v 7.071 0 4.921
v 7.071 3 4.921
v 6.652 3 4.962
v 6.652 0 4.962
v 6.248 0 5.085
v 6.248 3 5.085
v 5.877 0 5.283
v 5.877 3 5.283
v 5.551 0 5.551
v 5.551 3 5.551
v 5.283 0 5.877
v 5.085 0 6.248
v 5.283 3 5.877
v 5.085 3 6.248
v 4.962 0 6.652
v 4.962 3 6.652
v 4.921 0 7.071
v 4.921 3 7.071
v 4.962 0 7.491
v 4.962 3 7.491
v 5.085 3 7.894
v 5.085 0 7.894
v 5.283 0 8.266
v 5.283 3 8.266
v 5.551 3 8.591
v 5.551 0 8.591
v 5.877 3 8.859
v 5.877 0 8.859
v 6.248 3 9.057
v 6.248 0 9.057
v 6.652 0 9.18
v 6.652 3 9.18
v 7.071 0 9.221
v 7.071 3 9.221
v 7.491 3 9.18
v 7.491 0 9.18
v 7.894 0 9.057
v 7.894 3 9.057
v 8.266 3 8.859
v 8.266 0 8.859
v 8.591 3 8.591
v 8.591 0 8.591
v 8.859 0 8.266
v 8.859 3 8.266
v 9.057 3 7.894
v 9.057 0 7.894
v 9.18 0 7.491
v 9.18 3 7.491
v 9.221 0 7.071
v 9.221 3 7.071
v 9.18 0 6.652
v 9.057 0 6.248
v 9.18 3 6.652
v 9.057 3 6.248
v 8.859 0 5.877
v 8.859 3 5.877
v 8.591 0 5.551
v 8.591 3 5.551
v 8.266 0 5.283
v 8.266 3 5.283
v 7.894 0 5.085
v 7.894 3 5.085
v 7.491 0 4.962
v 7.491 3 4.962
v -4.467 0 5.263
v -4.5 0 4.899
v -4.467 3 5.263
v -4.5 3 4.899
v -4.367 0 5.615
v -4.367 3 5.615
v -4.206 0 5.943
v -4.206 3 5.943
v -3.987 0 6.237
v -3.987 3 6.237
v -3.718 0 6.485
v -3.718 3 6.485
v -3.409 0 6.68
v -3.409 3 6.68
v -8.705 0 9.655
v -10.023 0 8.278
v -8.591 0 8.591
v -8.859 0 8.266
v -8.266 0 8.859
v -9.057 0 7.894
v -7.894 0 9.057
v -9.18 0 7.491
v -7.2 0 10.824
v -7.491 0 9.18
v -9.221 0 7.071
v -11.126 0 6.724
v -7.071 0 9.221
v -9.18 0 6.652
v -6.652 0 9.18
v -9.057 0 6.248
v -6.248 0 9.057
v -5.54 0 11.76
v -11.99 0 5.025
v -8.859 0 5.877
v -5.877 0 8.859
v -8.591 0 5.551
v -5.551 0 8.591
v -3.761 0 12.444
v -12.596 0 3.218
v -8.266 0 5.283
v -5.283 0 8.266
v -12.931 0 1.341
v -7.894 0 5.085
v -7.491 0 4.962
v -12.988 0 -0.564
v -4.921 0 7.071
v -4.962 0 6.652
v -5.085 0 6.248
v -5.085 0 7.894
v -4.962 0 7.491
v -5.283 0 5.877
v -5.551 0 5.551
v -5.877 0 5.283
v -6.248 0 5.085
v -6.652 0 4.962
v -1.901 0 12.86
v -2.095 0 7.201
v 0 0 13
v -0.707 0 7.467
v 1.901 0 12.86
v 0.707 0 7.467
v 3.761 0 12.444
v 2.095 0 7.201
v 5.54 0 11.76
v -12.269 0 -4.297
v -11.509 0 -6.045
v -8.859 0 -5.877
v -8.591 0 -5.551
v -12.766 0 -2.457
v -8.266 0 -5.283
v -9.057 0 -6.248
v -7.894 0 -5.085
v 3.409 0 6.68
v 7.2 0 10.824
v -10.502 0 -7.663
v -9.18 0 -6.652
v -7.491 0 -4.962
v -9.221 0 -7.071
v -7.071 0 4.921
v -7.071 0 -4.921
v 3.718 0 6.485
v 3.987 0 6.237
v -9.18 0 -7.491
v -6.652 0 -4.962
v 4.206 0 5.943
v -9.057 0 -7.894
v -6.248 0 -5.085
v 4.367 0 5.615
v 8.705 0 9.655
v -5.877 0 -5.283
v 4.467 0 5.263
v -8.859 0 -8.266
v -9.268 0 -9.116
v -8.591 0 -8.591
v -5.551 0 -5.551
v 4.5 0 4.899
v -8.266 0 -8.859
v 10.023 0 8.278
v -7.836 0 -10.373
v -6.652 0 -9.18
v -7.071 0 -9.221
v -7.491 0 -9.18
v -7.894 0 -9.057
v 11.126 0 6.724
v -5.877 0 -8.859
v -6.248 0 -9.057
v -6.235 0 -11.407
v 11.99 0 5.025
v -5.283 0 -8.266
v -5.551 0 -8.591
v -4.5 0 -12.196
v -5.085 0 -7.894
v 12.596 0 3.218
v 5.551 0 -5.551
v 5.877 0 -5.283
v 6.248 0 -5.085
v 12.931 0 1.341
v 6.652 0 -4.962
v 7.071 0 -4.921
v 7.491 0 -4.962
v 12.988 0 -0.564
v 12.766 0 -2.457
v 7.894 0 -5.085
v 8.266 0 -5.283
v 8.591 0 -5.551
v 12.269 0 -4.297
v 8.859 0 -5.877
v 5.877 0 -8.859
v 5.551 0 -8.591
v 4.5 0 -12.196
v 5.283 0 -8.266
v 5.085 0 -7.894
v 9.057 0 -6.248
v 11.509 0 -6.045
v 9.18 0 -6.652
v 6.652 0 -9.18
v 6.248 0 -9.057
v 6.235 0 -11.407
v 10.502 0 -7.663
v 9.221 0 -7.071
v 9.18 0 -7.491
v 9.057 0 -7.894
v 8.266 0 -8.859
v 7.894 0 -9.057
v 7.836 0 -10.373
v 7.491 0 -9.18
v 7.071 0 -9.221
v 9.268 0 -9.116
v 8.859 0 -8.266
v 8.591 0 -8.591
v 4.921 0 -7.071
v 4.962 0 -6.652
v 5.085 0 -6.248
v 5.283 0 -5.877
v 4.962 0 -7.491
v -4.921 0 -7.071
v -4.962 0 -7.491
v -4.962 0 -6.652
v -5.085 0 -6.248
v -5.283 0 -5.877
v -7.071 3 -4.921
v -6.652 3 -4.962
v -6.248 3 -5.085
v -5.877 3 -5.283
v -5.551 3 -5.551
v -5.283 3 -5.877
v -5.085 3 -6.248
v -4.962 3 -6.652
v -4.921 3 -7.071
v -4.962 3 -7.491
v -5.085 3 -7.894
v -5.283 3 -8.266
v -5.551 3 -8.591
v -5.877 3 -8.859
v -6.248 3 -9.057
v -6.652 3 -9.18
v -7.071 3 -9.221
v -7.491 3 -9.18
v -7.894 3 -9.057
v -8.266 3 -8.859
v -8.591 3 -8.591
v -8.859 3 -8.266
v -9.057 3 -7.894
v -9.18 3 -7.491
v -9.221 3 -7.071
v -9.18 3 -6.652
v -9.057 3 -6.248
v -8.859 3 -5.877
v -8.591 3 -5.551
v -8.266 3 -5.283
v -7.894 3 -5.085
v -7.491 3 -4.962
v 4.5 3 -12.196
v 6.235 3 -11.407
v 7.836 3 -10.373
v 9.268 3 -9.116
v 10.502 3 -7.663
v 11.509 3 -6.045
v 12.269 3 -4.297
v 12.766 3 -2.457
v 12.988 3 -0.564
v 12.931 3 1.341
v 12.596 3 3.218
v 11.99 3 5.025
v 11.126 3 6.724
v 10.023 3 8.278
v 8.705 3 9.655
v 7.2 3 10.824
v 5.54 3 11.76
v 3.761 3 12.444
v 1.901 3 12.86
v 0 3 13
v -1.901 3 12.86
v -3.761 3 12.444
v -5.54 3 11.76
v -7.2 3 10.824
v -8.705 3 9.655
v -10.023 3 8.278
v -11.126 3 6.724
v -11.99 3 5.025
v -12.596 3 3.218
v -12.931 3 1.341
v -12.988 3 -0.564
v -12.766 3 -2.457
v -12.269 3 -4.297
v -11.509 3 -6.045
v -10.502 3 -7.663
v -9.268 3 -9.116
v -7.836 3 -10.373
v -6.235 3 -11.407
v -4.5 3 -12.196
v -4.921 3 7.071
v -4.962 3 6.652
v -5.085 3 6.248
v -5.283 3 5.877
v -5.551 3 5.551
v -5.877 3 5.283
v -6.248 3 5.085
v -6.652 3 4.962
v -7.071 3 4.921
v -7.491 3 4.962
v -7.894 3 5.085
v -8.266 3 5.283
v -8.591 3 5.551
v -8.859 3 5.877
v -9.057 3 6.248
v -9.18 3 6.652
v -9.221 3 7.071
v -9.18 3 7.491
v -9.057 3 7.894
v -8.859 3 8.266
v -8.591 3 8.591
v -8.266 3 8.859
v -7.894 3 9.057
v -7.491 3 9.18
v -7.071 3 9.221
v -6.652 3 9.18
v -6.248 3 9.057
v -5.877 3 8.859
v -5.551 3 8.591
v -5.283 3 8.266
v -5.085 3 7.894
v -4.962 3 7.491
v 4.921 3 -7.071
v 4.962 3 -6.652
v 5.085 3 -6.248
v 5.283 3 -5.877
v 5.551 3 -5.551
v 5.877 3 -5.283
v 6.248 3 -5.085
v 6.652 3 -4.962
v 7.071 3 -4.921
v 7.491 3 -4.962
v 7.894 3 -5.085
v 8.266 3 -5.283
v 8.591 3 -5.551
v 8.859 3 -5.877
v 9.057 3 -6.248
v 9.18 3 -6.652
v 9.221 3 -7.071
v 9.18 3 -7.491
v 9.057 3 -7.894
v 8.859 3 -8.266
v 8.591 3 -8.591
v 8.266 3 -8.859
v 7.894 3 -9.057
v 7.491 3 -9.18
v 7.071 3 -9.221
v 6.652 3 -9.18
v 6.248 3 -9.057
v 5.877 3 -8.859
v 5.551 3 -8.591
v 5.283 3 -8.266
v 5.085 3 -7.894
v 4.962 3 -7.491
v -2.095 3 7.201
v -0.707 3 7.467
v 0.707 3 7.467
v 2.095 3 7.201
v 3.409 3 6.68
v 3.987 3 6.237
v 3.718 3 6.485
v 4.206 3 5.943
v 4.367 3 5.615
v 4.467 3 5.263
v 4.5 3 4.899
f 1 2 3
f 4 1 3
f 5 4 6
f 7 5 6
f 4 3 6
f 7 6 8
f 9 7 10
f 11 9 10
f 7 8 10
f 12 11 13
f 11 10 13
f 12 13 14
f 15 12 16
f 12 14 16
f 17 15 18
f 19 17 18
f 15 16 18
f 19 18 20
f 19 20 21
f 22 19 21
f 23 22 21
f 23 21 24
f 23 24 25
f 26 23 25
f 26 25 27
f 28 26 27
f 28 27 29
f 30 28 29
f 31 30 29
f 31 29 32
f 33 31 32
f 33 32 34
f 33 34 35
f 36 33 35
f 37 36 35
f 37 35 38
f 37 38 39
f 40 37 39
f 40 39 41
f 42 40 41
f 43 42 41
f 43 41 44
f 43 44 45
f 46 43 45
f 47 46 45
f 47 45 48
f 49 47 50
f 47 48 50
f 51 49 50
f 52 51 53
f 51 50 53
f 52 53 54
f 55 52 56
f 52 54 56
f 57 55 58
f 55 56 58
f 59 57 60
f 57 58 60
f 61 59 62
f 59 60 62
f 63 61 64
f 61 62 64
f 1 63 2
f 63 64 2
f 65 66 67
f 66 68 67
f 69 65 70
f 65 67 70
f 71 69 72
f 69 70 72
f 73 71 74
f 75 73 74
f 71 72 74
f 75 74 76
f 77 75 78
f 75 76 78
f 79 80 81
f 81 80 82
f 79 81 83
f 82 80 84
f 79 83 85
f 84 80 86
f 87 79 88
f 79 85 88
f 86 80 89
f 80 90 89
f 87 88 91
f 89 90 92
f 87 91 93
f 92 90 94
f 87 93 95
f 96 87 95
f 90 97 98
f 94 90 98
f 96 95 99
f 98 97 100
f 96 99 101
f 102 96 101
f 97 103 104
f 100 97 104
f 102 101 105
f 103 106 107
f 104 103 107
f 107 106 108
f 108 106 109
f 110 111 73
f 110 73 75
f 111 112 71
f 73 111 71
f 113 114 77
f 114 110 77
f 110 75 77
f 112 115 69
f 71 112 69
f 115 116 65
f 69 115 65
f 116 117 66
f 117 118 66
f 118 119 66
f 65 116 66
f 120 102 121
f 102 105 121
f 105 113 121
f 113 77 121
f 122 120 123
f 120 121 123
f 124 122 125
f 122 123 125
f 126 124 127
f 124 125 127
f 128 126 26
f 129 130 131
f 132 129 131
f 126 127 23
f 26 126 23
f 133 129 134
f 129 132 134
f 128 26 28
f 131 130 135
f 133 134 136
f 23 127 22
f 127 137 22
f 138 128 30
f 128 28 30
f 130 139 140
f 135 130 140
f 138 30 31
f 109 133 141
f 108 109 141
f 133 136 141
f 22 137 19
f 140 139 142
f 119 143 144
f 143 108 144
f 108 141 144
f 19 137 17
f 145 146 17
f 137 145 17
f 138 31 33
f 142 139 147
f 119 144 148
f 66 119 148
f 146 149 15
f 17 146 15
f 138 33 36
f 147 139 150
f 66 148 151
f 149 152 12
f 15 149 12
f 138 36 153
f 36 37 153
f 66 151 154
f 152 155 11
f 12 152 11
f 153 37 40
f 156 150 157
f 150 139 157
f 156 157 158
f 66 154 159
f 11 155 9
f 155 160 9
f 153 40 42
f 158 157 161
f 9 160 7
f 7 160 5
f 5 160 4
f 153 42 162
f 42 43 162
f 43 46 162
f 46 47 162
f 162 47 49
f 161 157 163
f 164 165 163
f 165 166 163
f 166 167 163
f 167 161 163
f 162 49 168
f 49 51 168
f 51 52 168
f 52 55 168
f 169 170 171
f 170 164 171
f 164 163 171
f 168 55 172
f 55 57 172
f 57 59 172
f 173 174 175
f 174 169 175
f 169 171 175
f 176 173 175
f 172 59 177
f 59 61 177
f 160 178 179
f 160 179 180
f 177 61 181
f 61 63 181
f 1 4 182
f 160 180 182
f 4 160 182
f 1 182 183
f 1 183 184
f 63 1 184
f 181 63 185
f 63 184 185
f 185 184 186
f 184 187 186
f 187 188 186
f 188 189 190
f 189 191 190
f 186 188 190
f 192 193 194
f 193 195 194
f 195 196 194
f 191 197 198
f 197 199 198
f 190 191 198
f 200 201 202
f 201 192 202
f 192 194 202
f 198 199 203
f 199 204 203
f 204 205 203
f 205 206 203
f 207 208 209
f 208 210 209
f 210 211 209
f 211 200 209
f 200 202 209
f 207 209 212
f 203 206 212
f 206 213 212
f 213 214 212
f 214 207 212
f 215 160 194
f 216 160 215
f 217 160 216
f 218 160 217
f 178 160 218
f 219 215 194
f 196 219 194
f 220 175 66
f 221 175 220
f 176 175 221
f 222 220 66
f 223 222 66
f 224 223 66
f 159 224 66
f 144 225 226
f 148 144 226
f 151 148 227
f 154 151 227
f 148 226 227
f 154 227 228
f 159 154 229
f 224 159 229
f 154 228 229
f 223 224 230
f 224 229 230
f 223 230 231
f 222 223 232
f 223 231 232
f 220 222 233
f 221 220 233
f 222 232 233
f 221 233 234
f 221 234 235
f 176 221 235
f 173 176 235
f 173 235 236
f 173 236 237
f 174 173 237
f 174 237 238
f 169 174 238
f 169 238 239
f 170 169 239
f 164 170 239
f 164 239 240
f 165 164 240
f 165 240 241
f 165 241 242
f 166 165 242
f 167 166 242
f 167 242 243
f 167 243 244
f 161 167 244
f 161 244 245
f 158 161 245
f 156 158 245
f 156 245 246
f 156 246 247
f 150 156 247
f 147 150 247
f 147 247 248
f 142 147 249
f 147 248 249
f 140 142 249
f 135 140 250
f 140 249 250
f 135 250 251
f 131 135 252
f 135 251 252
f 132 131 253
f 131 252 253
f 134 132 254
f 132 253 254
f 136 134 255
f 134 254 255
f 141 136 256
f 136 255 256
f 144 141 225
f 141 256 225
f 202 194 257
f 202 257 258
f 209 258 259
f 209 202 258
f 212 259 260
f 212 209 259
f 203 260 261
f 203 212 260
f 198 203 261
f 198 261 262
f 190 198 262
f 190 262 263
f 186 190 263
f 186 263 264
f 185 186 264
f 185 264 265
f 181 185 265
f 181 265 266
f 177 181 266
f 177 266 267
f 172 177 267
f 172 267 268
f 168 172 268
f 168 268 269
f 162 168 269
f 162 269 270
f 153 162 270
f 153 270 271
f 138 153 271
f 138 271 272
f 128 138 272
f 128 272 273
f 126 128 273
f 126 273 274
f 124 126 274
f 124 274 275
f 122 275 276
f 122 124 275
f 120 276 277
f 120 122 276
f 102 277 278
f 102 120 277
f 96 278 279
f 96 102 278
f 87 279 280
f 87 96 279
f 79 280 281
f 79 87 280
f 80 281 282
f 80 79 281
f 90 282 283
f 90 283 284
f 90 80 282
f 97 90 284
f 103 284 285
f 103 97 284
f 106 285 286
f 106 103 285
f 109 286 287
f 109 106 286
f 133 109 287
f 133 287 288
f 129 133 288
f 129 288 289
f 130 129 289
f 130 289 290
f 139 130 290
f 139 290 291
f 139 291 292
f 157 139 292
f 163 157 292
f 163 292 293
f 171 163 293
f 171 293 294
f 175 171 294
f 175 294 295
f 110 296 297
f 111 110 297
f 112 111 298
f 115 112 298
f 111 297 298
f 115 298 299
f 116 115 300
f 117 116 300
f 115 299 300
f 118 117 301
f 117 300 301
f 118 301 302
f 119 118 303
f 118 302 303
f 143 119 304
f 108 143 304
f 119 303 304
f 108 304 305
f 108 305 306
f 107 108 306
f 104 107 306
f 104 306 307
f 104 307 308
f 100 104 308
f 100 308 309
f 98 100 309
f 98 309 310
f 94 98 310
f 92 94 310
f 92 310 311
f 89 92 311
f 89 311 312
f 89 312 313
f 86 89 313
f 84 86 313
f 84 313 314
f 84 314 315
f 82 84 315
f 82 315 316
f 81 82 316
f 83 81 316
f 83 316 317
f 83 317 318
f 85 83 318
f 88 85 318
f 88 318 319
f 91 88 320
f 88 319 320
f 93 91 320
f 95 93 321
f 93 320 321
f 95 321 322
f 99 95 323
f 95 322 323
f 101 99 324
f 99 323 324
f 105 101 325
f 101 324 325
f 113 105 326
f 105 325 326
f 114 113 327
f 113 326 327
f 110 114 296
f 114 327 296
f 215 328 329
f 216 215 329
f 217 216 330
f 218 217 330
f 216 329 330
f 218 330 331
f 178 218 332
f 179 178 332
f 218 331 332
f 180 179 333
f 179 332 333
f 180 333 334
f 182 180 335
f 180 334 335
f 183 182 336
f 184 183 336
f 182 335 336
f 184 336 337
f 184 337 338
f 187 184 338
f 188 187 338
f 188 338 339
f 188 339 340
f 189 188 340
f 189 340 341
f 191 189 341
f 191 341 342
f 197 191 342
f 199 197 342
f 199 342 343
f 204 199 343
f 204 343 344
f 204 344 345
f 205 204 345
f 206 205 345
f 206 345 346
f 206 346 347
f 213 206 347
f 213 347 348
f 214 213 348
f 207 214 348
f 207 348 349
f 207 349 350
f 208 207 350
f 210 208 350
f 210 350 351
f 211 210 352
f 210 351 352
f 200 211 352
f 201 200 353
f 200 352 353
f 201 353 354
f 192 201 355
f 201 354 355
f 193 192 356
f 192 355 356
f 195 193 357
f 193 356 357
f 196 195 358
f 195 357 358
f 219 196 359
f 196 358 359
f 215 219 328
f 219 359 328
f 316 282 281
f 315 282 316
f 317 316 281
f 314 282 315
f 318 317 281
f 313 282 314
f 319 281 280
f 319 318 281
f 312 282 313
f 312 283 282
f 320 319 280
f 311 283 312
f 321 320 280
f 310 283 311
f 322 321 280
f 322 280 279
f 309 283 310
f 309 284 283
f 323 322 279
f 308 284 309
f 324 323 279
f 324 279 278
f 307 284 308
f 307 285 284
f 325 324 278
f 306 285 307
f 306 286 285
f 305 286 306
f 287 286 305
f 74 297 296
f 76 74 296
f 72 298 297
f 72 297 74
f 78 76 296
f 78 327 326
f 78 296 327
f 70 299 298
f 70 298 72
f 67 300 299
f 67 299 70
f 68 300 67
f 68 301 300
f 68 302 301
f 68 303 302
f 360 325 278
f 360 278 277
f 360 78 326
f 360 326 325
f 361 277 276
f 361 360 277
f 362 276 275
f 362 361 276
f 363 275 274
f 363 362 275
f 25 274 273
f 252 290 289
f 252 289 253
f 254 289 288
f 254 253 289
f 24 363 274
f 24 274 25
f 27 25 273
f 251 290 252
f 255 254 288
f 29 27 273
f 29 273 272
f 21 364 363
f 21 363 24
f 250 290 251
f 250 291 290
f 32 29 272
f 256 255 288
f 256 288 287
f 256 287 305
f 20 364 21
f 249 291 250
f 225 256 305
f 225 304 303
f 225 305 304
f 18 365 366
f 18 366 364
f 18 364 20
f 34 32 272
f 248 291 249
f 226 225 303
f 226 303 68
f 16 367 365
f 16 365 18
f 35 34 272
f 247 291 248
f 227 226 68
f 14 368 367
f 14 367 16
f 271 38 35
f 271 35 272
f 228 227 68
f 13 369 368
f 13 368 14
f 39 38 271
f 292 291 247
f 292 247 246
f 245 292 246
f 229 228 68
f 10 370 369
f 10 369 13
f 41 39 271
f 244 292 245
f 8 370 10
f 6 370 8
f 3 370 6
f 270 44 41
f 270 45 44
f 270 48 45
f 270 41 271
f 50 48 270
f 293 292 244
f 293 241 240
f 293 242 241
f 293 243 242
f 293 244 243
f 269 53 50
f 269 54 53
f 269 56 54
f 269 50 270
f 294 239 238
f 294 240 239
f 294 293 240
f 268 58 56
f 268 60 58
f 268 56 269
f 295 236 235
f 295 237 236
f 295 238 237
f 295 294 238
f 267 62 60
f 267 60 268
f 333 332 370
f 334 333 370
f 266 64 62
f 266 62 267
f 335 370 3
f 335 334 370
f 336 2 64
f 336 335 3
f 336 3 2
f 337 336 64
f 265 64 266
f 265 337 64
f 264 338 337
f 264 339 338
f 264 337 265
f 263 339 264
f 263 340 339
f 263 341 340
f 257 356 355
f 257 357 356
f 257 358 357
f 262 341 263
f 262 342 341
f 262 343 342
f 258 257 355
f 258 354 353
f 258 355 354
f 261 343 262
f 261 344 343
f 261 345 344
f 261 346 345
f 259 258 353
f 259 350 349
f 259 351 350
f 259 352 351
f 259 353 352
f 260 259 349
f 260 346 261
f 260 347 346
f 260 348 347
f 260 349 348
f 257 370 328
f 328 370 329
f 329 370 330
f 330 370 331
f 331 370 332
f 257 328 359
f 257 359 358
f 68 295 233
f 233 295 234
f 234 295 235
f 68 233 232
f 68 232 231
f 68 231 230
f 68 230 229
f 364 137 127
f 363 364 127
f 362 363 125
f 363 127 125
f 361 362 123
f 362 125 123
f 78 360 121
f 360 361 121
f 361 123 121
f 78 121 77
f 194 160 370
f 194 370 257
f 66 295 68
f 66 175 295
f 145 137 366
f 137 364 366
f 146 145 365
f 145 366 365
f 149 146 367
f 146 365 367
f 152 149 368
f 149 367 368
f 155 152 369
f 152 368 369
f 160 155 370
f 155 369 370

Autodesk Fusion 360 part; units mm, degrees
sketch "Sketch1" plane through (0, 0, 0) normal (0, 1, 0) x (1, 0, 0)
  circle A0 centre (0, 0) radius 13
  circle A1 centre (0, 0) radius 7.5
  line L0 (-4.5, 12.1963) -> (-4.5, -6)
  line L1 (4.5, -6) -> (4.5, 12.1963)
  circle A2 centre (0, 0) radius 10 construction
  line L2 (0, 0) -> (7.0711, -7.0711)
  line L3 (0, 0) -> (13, 0) construction
  point P0 (7.0711, -7.0711)
  dimension "d1" = 26
  dimension "d2" = 15
  dimension "d3" = 9
  dimension "d4" = 20
  dimension "d12" = 45
extrude "Extrude1" add sketch "Sketch1" along normal blind 3 contours A0 A1 L0 L1 | A1 L1 L2 | A1 L0 | A1 L1 L2 picked at (8.8444, -6.7794)
hole "Hole1" at (7.0711, 0, 7.0711) direction (0, 1, 0) diameter 4.3 end through all
pattern_circular "C-Pattern1" count 4 over 360 about axis through (0, 1.75, 0) along (0, 1, 0) of "Hole1"
fillet "Fillet1" radius 2 2 edges at (-4.5, 1.5, 6) (4.5, 1.5, 6)
sketch "Sketch2" plane through (0, 3, 0) normal (0, 1, 0) x (-1, 0, 0)
  circle A0 centre (7.0711, 7.0711) radius 2.15
  circle A1 centre (7.0711, -7.0711) radius 2.15
  circle A2 centre (-7.0711, -7.0711) radius 2.15
  circle A3 centre (-7.0711, 7.0711) radius 2.15
  arc A4 (4.5, -12.1963) -> (-4.5, -12.1963) centre (0, 0) ccw
  line L0 (-4.5, -12.1963) -> (-4.5, 4.899)
  arc A5 (-3.4091, 6.6804) -> (-4.5, 4.899) centre (-2.5, 4.899) ccw
  arc A6 (3.4091, 6.6804) -> (-3.4091, 6.6804) centre (0, 0) ccw
  arc A7 (4.5, 4.899) -> (3.4091, 6.6804) centre (2.5, 4.899) ccw
  line L1 (4.5, 4.899) -> (4.5, -12.1963)
